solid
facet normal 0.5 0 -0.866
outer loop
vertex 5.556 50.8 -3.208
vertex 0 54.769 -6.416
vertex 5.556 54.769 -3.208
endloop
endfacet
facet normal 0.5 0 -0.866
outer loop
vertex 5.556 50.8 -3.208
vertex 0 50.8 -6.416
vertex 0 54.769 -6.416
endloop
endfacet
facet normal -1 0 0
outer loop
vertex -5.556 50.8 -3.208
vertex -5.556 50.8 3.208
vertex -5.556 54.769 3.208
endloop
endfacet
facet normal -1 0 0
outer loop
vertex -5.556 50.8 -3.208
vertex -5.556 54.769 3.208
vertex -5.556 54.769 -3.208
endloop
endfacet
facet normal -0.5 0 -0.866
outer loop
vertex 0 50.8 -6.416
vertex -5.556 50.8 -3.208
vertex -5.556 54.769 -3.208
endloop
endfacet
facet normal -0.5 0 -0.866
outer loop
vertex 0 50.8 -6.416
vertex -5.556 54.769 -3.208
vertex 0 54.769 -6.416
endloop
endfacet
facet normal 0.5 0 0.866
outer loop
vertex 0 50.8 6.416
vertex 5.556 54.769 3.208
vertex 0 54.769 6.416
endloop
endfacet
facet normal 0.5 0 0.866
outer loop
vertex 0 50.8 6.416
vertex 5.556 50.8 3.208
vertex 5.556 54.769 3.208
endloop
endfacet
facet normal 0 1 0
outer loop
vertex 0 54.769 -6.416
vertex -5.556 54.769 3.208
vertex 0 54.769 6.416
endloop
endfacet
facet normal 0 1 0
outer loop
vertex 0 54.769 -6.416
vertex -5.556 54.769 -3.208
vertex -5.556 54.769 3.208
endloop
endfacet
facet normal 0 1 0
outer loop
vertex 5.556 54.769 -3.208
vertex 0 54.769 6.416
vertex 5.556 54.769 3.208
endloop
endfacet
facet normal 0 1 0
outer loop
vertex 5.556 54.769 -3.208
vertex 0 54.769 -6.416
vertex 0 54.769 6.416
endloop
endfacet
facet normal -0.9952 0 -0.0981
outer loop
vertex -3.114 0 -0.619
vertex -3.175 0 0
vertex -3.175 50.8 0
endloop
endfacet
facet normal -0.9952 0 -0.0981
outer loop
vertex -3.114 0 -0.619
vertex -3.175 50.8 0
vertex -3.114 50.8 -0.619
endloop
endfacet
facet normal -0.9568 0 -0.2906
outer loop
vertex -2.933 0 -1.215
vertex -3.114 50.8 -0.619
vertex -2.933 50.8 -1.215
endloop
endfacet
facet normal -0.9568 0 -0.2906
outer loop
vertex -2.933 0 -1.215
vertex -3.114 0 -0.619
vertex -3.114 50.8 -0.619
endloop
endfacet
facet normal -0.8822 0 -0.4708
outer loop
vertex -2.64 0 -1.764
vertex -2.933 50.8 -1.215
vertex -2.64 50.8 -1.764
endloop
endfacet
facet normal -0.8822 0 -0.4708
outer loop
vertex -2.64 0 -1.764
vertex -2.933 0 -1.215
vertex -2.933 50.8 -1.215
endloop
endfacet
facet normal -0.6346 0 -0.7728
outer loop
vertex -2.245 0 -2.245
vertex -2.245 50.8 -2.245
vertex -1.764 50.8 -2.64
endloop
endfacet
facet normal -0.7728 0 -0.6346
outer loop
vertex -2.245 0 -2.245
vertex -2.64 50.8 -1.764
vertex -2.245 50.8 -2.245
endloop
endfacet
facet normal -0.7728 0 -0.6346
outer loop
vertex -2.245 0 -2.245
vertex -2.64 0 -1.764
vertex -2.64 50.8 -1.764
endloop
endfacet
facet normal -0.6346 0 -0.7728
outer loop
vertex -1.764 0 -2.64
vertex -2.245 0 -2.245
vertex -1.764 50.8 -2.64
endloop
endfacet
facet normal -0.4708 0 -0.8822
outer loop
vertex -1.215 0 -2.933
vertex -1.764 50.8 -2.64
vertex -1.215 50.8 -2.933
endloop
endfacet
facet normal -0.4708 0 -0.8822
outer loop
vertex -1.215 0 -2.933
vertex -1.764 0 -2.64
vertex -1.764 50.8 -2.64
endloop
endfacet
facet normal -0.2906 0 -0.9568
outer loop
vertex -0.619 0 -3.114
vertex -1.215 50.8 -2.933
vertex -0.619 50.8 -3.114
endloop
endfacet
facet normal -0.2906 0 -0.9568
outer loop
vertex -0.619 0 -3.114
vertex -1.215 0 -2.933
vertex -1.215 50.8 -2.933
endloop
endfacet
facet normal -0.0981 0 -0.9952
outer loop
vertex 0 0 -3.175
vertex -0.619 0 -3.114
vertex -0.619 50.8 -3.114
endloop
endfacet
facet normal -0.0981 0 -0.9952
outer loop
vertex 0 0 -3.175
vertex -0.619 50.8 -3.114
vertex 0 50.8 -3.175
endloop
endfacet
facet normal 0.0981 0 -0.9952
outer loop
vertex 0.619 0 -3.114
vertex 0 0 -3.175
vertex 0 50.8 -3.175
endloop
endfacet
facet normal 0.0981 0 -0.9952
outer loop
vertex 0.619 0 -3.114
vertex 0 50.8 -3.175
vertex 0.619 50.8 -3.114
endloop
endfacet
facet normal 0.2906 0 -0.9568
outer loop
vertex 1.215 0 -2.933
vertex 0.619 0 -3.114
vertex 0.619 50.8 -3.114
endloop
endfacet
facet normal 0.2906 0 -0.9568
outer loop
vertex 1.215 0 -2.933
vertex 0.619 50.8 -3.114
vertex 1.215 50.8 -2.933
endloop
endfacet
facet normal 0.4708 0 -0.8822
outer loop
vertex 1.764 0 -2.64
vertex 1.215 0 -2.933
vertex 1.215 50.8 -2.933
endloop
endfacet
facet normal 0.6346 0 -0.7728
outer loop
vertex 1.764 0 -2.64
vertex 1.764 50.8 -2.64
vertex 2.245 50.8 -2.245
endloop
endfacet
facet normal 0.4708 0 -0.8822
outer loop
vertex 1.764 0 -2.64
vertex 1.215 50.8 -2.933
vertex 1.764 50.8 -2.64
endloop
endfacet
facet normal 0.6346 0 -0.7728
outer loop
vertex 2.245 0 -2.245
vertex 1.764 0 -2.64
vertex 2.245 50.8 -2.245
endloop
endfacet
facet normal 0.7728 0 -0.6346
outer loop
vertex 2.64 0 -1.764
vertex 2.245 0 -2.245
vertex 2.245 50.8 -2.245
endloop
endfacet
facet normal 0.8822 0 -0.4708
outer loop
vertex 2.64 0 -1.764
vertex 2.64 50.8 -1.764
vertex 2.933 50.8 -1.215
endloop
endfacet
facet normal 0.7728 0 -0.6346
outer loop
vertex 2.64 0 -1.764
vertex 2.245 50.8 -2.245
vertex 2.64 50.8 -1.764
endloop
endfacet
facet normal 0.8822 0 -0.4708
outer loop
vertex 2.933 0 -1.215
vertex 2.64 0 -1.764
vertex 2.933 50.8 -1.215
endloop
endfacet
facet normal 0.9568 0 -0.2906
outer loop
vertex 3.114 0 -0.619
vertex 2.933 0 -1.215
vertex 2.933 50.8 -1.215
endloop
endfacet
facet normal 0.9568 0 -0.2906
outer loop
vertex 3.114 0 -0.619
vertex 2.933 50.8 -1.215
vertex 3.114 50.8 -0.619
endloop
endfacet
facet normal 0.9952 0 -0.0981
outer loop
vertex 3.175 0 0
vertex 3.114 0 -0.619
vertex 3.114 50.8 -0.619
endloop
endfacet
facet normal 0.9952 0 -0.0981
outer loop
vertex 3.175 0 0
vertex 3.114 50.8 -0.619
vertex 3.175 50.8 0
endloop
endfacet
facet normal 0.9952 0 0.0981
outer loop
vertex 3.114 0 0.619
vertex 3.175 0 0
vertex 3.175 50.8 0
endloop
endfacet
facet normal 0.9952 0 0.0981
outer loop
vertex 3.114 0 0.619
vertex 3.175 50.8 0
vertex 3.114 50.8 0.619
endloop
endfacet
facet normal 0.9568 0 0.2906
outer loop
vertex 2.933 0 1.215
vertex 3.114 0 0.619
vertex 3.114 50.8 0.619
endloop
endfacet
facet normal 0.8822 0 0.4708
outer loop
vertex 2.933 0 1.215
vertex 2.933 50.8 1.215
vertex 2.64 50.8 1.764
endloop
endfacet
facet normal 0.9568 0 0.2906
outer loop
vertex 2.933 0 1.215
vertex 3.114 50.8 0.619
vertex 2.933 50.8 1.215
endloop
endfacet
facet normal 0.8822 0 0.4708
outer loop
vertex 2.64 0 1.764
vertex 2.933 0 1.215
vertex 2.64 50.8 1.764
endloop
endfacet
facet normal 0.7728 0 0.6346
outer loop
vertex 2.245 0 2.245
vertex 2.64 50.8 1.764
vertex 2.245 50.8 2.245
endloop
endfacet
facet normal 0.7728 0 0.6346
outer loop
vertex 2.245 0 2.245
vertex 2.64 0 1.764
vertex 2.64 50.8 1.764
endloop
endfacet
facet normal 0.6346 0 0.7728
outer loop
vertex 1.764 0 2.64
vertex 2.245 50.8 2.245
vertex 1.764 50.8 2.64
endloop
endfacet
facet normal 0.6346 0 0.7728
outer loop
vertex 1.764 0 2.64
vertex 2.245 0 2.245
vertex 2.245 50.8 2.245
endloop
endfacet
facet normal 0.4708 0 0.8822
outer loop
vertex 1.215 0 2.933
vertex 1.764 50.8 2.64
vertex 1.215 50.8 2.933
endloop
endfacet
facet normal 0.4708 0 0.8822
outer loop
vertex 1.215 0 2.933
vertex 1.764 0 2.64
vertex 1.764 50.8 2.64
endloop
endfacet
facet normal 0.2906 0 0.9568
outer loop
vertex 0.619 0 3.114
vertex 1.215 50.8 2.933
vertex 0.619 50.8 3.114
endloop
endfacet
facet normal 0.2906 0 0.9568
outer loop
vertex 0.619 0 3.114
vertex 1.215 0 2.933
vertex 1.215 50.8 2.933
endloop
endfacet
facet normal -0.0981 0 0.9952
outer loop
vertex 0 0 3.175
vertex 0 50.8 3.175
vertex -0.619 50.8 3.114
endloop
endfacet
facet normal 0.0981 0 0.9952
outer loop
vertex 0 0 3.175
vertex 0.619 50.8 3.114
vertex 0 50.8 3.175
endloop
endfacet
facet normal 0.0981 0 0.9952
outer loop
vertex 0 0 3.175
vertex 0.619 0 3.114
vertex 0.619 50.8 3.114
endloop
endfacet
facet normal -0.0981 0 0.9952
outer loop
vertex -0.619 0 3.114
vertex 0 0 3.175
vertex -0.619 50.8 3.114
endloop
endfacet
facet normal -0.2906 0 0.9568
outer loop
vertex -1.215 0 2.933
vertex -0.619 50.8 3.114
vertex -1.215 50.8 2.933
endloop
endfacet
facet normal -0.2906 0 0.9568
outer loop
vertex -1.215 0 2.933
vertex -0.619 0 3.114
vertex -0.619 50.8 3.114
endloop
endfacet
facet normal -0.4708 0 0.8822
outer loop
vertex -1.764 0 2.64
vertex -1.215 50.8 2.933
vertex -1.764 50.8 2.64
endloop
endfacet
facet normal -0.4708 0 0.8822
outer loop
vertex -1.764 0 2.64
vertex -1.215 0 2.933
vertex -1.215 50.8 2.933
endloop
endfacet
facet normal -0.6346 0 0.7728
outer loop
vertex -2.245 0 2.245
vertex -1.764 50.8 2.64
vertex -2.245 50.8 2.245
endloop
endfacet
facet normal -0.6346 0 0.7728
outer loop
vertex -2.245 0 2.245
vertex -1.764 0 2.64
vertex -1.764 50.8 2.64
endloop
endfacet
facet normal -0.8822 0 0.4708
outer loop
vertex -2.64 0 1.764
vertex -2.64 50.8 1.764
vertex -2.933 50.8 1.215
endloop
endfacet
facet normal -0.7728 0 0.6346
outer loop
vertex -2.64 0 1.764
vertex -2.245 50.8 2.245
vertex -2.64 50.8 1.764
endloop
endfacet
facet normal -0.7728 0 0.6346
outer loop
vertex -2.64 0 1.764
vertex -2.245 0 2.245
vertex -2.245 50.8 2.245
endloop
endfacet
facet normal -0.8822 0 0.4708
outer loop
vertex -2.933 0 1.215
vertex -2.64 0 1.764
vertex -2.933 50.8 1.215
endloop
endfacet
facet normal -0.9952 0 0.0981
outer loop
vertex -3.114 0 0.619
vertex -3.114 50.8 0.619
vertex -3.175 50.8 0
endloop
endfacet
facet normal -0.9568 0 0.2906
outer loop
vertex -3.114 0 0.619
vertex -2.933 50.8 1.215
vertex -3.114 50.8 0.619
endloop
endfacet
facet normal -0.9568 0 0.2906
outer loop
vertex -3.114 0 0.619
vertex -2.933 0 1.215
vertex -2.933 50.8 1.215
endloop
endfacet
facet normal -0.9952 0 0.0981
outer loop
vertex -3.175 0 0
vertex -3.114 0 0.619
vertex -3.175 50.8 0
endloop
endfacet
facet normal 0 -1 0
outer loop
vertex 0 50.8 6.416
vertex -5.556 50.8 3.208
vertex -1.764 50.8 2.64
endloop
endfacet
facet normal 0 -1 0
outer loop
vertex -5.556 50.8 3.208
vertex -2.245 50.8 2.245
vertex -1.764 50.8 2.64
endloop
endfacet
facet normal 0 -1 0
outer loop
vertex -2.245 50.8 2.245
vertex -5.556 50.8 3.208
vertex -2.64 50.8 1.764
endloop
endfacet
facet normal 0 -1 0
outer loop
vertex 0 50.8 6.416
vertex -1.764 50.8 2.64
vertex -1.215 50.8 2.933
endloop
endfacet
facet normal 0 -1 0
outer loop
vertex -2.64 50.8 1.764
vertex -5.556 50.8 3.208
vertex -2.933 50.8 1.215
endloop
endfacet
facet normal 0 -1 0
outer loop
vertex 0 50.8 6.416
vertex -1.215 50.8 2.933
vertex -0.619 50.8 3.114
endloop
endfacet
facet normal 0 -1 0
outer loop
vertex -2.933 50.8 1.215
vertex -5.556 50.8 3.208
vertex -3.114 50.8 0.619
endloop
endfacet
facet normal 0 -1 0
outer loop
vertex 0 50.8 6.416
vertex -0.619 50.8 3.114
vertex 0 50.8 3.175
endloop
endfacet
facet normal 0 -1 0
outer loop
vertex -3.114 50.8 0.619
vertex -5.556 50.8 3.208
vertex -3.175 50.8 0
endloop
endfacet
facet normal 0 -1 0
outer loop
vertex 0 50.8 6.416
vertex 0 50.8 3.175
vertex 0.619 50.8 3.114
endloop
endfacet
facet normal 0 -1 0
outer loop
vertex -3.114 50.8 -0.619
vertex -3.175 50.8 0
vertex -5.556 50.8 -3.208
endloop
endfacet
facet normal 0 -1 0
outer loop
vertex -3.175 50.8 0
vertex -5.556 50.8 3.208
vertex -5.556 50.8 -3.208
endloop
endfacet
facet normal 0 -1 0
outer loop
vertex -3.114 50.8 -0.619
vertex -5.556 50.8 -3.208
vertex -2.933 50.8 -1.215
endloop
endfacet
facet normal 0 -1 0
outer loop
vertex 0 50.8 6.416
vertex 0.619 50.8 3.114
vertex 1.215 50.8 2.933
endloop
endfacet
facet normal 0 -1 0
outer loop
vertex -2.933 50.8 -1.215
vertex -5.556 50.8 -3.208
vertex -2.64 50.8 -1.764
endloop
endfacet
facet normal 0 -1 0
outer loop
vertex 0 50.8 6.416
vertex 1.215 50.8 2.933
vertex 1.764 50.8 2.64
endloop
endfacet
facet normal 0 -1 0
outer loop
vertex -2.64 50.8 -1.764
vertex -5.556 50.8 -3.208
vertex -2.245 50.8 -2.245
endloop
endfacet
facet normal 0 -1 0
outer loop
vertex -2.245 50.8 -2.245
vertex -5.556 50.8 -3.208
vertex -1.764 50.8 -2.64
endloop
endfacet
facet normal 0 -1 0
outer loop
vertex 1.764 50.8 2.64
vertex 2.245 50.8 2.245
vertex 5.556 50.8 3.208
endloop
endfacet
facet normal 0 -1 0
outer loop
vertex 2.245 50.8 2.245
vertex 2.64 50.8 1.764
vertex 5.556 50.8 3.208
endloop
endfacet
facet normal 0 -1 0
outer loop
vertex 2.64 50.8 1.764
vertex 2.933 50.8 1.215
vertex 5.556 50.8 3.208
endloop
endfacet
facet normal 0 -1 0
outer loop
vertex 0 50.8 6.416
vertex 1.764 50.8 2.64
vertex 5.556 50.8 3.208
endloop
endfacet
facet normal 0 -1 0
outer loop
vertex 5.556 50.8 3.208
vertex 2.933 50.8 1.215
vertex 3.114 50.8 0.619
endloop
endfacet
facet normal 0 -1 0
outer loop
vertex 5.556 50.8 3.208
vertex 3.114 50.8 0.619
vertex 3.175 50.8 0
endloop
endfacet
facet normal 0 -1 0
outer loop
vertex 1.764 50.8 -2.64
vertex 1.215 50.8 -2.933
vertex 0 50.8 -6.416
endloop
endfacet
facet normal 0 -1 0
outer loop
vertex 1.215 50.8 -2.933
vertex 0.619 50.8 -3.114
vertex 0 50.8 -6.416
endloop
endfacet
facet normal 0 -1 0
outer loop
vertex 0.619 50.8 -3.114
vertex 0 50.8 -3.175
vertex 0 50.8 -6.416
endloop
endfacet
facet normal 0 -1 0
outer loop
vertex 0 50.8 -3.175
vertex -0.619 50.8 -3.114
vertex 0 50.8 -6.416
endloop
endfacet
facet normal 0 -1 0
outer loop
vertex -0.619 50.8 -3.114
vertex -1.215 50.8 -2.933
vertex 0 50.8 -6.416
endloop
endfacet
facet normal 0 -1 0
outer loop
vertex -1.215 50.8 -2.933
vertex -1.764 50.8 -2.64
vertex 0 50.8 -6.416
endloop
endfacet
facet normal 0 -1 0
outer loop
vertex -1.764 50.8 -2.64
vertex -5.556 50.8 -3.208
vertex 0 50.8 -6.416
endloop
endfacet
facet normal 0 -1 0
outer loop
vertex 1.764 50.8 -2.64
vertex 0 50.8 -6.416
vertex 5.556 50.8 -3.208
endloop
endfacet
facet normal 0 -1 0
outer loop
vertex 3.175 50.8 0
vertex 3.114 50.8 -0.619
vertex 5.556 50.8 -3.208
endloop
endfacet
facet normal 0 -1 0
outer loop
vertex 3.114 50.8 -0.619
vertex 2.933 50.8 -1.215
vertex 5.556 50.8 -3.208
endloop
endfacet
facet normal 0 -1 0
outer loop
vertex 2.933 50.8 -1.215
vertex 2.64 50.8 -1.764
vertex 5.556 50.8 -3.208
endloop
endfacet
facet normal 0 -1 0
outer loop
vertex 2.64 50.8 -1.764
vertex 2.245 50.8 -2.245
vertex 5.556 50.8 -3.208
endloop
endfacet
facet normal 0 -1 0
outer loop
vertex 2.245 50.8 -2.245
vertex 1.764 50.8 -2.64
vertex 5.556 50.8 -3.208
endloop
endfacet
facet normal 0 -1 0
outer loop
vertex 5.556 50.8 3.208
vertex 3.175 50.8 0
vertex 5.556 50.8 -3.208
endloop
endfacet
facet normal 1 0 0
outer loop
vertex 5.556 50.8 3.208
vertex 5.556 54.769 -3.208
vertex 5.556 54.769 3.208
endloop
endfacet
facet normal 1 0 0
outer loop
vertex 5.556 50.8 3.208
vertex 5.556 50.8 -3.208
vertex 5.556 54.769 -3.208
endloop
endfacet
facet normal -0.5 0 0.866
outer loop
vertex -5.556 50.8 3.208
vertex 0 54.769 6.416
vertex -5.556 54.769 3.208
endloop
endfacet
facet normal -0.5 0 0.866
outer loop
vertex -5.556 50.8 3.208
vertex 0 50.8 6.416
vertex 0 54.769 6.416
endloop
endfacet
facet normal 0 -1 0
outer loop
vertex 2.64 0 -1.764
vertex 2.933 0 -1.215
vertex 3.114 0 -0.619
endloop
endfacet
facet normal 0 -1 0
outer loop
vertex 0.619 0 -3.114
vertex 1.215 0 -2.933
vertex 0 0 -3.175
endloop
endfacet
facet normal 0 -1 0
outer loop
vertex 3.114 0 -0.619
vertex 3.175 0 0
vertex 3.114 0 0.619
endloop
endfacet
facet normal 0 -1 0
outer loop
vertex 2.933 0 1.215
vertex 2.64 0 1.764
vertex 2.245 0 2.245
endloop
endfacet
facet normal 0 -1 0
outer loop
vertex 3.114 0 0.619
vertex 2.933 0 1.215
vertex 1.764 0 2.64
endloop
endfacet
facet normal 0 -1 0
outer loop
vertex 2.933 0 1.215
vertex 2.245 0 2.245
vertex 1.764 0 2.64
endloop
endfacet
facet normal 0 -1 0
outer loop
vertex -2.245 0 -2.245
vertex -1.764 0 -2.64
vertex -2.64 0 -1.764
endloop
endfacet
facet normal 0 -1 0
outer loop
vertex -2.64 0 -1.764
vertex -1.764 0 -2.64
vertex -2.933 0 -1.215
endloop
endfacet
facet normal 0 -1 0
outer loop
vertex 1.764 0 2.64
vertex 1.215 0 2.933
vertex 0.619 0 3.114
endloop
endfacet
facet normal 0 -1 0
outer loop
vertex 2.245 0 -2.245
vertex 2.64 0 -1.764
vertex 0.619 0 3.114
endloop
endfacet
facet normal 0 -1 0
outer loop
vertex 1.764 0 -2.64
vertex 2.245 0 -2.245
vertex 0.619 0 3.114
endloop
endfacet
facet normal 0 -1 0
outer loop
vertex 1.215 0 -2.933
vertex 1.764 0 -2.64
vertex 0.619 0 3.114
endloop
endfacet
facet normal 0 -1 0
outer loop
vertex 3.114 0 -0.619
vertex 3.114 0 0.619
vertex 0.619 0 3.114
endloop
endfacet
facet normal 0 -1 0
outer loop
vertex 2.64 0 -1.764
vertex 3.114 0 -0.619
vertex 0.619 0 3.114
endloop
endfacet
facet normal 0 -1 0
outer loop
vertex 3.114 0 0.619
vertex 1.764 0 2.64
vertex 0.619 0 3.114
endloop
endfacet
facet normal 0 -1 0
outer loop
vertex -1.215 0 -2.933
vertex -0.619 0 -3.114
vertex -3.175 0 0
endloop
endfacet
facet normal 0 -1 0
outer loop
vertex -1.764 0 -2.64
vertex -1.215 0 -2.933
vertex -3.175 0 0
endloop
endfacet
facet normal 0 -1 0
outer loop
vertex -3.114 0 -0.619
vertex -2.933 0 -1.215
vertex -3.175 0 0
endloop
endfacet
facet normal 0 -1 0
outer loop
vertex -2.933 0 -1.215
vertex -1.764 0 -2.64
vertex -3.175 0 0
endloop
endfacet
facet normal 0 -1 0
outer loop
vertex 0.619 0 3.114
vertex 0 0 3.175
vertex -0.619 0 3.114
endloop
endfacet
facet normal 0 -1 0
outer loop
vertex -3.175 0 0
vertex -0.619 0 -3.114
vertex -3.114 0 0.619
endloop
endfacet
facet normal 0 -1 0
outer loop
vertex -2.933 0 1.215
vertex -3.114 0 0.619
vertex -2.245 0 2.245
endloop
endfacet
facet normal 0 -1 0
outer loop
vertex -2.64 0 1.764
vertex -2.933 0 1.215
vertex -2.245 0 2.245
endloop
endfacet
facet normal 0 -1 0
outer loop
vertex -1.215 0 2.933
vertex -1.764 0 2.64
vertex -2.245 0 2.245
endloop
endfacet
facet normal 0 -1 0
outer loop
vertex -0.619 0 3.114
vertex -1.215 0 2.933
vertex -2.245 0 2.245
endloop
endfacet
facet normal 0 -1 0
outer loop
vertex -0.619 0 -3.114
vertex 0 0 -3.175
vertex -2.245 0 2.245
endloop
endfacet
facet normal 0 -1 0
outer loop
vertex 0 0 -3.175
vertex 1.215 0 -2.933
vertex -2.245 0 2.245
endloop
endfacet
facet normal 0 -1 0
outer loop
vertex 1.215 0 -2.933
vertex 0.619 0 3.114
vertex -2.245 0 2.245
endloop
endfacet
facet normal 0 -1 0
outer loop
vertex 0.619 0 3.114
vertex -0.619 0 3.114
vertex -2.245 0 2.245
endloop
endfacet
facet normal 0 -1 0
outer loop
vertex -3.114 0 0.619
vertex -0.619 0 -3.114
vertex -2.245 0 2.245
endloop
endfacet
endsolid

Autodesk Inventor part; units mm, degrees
ref_plane "YZ Plane" through (0, 0, 0) normal (1, 0, 0) x (0, 1, 0)
ref_plane "XZ Plane" through (0, 0, 0) normal (0, 1, 0) x (-1, 0, 0)
ref_plane "XY Plane" through (0, 0, 0) normal (0, 0, 1) x (1, 0, 0)
sketch "Sketch1" plane through (0, 0, 0) normal (0, 1, 0) x (-1, 0, 0)
  circle A0 centre (0, 0) radius 3.175
  dimension "d0" = 6.35
extrude "Extrusion1" add sketch "Sketch1" along normal blind 50.8
sketch "Sketch2" plane through (0, 50.8, 0) normal (0, 1, 0) x (1, 0, 0)
  circle A0 centre (0, 0) radius 3.175 projected
  line L0 (-5.5563, -3.2079) -> (-5.5563, 3.2079)
  line L1 (-5.5563, 3.2079) -> (0, 6.4158)
  line L2 (0, 6.4158) -> (5.5563, 3.2079)
  line L3 (5.5563, 3.2079) -> (5.5563, -3.2079)
  line L4 (5.5563, -3.2079) -> (0, -6.4158)
  line L5 (0, -6.4158) -> (-5.5563, -3.2079)
  dimension "d3" = 11.1125
  dimension "d4" = 11.1125
  dimension "d5" = 11.1125
  dimension "d6" = 120
  dimension "d7" = 120
  dimension "d8" = 5.5563
  dimension "d9" = 5.5563
  dimension "d10" = 5.5563
extrude "Extrusion2" add sketch "Sketch2" along normal blind 3.9688 contours A0 | L0 L1 L2 L3 L4 L5
thread "Thread1" size "1/4-20 UNC" class "2A" standard "ANSI Unified Screw Threads" length 19.05 offset 31.75
properties part number "beam breaker bolt" material "Steel, Alloy"
